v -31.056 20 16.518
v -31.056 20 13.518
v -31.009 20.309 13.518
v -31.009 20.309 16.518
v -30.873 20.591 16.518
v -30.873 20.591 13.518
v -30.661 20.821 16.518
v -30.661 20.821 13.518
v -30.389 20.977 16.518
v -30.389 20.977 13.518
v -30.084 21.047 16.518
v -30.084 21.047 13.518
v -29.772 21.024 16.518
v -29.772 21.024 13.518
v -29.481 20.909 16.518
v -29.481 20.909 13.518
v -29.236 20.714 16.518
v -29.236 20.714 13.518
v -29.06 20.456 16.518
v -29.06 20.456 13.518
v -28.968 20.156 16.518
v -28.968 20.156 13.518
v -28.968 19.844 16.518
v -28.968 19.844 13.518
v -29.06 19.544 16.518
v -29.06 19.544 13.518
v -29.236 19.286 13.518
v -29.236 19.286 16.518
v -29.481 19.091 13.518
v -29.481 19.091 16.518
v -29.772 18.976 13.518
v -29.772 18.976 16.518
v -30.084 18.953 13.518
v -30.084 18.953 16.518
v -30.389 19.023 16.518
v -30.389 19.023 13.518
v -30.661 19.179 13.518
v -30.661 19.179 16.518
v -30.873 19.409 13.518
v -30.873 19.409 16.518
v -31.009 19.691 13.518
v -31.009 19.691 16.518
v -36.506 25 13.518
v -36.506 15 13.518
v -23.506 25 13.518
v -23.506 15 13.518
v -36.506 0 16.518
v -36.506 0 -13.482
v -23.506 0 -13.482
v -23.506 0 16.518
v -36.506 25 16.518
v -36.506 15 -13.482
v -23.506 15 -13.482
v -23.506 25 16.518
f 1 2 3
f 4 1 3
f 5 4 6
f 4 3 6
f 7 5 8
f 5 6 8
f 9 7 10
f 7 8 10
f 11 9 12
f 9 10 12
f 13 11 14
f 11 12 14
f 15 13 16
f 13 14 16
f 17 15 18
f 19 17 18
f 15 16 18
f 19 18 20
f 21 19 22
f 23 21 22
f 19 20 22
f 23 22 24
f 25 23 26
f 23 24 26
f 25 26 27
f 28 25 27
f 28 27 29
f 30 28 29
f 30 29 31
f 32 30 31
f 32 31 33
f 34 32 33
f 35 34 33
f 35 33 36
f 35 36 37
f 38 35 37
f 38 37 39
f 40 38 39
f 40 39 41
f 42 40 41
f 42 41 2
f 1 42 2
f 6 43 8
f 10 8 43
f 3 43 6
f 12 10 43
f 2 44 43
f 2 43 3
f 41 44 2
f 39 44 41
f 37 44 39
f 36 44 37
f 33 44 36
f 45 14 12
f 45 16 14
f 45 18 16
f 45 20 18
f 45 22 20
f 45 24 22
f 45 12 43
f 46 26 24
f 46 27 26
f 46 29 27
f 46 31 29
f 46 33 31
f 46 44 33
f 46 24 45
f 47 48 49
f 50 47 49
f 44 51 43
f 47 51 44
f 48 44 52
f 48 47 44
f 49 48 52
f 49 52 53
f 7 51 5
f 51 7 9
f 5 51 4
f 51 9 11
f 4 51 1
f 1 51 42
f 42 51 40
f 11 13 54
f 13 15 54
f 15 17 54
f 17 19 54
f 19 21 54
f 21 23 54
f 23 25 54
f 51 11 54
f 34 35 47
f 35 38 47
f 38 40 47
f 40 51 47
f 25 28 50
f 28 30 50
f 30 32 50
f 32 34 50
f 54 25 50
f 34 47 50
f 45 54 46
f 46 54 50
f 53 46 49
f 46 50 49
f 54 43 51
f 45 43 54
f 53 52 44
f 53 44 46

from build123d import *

# Parameters (mm, degrees)
SKETCH1_W           = 13
SKETCH1_H           = 30
BOSS_EXTRUDE1_DEPTH = 15
SKETCH2_W           = 13
SKETCH2_H           = 3
BOSS_EXTRUDE2_DEPTH = 10
SKETCH3_R           = 1.05
CUT_EXTRUDE1_DEPTH  = 52.833163371


with BuildPart() as part:
    # Sketch1 → Boss-Extrude1 (new body)
    with BuildSketch(Plane(origin=(0, 0, 0), x_dir=(1, 0, 0), z_dir=(0, 1, 0))):
        with Locations((-30.005846449, -1.517902626)):
            Rectangle(SKETCH1_W, SKETCH1_H)
    extrude(amount=BOSS_EXTRUDE1_DEPTH)

    # Sketch2 → Boss-Extrude2 (add)
    with BuildSketch(Plane(origin=(0, 15, 0), x_dir=(1, 0, 0), z_dir=(0, 1, 0))):
        with Locations((-30.005846449, -15.017902626)):
            Rectangle(SKETCH2_W, SKETCH2_H)
    extrude(amount=BOSS_EXTRUDE2_DEPTH)

    # Sketch3 → Cut-Extrude1 (cut, through all)
    with BuildSketch(Plane(origin=(0, 0, 13.517902626), x_dir=(-1, 0, 0), z_dir=(0, 0, -1))):
        with Locations((30.005846449, 20)):
            Circle(SKETCH3_R)
    extrude(amount=-CUT_EXTRUDE1_DEPTH, mode=Mode.SUBTRACT)


solid = part.part
